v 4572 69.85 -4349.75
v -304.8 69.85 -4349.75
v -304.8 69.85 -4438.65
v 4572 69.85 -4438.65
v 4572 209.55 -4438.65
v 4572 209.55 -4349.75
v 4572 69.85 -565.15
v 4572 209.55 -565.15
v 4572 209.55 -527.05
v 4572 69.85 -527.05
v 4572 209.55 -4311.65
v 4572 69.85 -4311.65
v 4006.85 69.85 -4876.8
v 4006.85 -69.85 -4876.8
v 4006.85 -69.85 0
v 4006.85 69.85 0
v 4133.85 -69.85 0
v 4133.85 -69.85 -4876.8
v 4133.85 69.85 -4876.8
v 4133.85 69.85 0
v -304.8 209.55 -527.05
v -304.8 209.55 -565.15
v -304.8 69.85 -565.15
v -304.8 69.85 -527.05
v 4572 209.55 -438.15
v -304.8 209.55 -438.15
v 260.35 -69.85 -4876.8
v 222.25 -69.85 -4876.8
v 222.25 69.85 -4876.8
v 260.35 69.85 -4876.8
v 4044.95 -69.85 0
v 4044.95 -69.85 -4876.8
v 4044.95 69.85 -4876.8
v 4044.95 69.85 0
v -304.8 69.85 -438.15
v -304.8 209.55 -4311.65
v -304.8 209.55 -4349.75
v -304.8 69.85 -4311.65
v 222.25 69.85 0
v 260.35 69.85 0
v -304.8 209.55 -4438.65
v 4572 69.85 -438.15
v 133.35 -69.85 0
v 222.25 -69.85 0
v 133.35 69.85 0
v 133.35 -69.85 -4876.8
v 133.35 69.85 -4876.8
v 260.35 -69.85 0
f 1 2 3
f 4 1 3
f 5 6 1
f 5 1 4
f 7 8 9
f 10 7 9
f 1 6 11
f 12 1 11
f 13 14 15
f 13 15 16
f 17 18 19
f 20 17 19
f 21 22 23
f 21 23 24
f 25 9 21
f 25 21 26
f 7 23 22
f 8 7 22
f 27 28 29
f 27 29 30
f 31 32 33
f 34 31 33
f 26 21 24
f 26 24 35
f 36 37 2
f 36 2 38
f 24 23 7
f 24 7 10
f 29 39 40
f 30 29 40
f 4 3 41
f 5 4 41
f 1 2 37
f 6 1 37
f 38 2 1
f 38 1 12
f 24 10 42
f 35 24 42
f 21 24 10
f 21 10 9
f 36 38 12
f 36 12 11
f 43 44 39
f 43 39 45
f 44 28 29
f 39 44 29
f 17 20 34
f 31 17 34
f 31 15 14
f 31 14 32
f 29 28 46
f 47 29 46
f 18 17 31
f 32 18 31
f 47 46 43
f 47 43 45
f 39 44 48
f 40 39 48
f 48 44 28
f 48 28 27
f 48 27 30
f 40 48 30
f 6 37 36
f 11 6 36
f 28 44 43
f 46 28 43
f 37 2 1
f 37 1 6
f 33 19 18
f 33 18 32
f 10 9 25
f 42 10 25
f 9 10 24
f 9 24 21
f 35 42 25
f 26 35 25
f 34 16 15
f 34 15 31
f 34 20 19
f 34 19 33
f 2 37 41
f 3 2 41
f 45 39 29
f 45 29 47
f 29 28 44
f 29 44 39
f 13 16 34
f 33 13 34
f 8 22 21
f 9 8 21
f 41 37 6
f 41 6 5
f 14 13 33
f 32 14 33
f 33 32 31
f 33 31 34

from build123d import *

# Parameters (mm, degrees)
SKETCH1_W              = 88.9
SKETCH1_H              = 139.7
PROFILES_4X6_1_DEPTH   = 4876.8
SKETCH1_ON_SEGMENT_2_W = 88.9
SKETCH1_ON_SEGMENT_2_H = 139.7
PROFILES_4X6_1_2_DEPTH = 4876.8
SKETCH1_ON_SEGMENT_3_W = 88.9
SKETCH1_ON_SEGMENT_3_H = 139.7
PROFILES_4X6_1_3_DEPTH = 4876.8
SKETCH1_ON_SEGMENT_4_W = 88.9
SKETCH1_ON_SEGMENT_4_H = 139.7
PROFILES_4X6_1_4_DEPTH = 4876.8
SKETCH13_W             = 38.1
SKETCH13_H             = 139.7
BOSS_EXTRUDE1_DEPTH    = 4876.8
BOSS_EXTRUDE1_2_DEPTH  = 4876.8
SKETCH14_W             = 38.1
SKETCH14_H             = 139.7
BOSS_EXTRUDE2_DEPTH    = 4876.8
BOSS_EXTRUDE2_2_DEPTH  = 4876.8


with BuildPart() as part:
    # Sketch1 → Profiles 4X6(1) (new body)
    with BuildSketch(Plane(origin=(177.8, 0, 0), x_dir=(-1, 0, 0), z_dir=(0, 0, -1))):
        Rectangle(SKETCH1_W, SKETCH1_H)
    extrude(amount=PROFILES_4X6_1_DEPTH)


with BuildPart() as body_2:
    # Sketch1 on segment 2 (carried to segment 2) → Profiles 4X6_1 2 (new body)
    with BuildSketch(Plane(origin=(4089.4, 0, 0), x_dir=(-1, 0, 0), z_dir=(0, 0, -1))):
        Rectangle(SKETCH1_ON_SEGMENT_2_W, SKETCH1_ON_SEGMENT_2_H)
    extrude(amount=PROFILES_4X6_1_2_DEPTH)


with BuildPart() as body_3:
    # Sketch1 on segment 3 (carried to segment 3) → Profiles 4X6_1 3 (new body)
    with BuildSketch(Plane(origin=(-304.8, 139.7, -4394.2), x_dir=(0, 0, -1), z_dir=(1, 0, 0))):
        Rectangle(SKETCH1_ON_SEGMENT_3_W, SKETCH1_ON_SEGMENT_3_H)
    extrude(amount=PROFILES_4X6_1_3_DEPTH)


with BuildPart() as body_4:
    # Sketch1 on segment 4 (carried to segment 4) → Profiles 4X6_1 4 (new body)
    with BuildSketch(Plane(origin=(4572, 139.7, -482.6), x_dir=(0, 0, 1), z_dir=(-1, 0, 0))):
        Rectangle(SKETCH1_ON_SEGMENT_4_W, SKETCH1_ON_SEGMENT_4_H)
    extrude(amount=PROFILES_4X6_1_4_DEPTH)


with BuildPart() as body_5:
    # Sketch13 → Boss-Extrude1 (new body)
    with BuildSketch(Plane.ZY.offset(304.8)):
        with Locations((-4330.7, 139.7)):
            Rectangle(SKETCH13_W, SKETCH13_H)
    extrude(amount=-BOSS_EXTRUDE1_DEPTH)


with BuildPart() as body_6:
    # Sketch13 → Boss-Extrude1 2 (new body)
    with BuildSketch(Plane.ZY.offset(304.8)):
        with Locations((-546.1, 139.7)):
            Rectangle(SKETCH13_W, SKETCH13_H)
    extrude(amount=-BOSS_EXTRUDE1_2_DEPTH)


with BuildPart() as body_7:
    # Sketch14 → Boss-Extrude2 (new body)
    with BuildSketch(Plane.XY):
        with Locations((241.3, 0)):
            Rectangle(SKETCH14_W, SKETCH14_H)
    extrude(amount=-BOSS_EXTRUDE2_DEPTH)


with BuildPart() as body_8:
    # Sketch14 → Boss-Extrude2 2 (new body)
    with BuildSketch(Plane.XY):
        with Locations((4025.9, 0)):
            Rectangle(SKETCH14_W, SKETCH14_H)
    extrude(amount=-BOSS_EXTRUDE2_2_DEPTH)


solid = Compound([part.part, body_2.part, body_3.part, body_4.part, body_5.part, body_6.part, body_7.part, body_8.part])
